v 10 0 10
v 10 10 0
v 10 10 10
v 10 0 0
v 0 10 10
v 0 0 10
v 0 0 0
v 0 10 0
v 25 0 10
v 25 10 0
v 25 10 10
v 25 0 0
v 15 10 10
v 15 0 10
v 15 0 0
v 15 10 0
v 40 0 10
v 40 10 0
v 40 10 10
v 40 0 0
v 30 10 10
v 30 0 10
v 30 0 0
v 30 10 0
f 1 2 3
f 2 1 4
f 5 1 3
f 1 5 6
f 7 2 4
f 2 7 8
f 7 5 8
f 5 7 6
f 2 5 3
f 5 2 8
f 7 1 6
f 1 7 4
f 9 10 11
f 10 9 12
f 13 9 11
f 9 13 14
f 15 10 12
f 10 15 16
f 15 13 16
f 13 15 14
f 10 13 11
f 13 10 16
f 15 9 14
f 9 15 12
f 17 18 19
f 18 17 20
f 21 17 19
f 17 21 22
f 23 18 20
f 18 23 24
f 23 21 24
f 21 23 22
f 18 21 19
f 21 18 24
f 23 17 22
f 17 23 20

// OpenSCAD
/*
 * The for loop iterates over a range of items.
 * For loops can be written several different ways depending on the programmers preference.
 * OpenSCAD loops use ':' in place of ';'.
 * Parameters:
 *      start - value representing the beginning of the items to be iterated over
 *      increment - amount increase each time the loop is ran
 *      end - value representing the end of the items being iterated over
 *      vector - iterates over each member in the vector
 */

vector = [0, 1, 2, 3, 4, 5];

echo("##########");

for (i = vector)
    echo(i);

echo("##########");

for (i = [2: 2: 10])
    echo(i);

echo("##########");

for (i = [[10, 15], 5, 6, [1, 2, 3]])
    echo(i);

echo("##########");

for (i = [0: 15: 15*2]) {
    translate([i, 0, 0])
        cube([10, 10, 10]);
}
